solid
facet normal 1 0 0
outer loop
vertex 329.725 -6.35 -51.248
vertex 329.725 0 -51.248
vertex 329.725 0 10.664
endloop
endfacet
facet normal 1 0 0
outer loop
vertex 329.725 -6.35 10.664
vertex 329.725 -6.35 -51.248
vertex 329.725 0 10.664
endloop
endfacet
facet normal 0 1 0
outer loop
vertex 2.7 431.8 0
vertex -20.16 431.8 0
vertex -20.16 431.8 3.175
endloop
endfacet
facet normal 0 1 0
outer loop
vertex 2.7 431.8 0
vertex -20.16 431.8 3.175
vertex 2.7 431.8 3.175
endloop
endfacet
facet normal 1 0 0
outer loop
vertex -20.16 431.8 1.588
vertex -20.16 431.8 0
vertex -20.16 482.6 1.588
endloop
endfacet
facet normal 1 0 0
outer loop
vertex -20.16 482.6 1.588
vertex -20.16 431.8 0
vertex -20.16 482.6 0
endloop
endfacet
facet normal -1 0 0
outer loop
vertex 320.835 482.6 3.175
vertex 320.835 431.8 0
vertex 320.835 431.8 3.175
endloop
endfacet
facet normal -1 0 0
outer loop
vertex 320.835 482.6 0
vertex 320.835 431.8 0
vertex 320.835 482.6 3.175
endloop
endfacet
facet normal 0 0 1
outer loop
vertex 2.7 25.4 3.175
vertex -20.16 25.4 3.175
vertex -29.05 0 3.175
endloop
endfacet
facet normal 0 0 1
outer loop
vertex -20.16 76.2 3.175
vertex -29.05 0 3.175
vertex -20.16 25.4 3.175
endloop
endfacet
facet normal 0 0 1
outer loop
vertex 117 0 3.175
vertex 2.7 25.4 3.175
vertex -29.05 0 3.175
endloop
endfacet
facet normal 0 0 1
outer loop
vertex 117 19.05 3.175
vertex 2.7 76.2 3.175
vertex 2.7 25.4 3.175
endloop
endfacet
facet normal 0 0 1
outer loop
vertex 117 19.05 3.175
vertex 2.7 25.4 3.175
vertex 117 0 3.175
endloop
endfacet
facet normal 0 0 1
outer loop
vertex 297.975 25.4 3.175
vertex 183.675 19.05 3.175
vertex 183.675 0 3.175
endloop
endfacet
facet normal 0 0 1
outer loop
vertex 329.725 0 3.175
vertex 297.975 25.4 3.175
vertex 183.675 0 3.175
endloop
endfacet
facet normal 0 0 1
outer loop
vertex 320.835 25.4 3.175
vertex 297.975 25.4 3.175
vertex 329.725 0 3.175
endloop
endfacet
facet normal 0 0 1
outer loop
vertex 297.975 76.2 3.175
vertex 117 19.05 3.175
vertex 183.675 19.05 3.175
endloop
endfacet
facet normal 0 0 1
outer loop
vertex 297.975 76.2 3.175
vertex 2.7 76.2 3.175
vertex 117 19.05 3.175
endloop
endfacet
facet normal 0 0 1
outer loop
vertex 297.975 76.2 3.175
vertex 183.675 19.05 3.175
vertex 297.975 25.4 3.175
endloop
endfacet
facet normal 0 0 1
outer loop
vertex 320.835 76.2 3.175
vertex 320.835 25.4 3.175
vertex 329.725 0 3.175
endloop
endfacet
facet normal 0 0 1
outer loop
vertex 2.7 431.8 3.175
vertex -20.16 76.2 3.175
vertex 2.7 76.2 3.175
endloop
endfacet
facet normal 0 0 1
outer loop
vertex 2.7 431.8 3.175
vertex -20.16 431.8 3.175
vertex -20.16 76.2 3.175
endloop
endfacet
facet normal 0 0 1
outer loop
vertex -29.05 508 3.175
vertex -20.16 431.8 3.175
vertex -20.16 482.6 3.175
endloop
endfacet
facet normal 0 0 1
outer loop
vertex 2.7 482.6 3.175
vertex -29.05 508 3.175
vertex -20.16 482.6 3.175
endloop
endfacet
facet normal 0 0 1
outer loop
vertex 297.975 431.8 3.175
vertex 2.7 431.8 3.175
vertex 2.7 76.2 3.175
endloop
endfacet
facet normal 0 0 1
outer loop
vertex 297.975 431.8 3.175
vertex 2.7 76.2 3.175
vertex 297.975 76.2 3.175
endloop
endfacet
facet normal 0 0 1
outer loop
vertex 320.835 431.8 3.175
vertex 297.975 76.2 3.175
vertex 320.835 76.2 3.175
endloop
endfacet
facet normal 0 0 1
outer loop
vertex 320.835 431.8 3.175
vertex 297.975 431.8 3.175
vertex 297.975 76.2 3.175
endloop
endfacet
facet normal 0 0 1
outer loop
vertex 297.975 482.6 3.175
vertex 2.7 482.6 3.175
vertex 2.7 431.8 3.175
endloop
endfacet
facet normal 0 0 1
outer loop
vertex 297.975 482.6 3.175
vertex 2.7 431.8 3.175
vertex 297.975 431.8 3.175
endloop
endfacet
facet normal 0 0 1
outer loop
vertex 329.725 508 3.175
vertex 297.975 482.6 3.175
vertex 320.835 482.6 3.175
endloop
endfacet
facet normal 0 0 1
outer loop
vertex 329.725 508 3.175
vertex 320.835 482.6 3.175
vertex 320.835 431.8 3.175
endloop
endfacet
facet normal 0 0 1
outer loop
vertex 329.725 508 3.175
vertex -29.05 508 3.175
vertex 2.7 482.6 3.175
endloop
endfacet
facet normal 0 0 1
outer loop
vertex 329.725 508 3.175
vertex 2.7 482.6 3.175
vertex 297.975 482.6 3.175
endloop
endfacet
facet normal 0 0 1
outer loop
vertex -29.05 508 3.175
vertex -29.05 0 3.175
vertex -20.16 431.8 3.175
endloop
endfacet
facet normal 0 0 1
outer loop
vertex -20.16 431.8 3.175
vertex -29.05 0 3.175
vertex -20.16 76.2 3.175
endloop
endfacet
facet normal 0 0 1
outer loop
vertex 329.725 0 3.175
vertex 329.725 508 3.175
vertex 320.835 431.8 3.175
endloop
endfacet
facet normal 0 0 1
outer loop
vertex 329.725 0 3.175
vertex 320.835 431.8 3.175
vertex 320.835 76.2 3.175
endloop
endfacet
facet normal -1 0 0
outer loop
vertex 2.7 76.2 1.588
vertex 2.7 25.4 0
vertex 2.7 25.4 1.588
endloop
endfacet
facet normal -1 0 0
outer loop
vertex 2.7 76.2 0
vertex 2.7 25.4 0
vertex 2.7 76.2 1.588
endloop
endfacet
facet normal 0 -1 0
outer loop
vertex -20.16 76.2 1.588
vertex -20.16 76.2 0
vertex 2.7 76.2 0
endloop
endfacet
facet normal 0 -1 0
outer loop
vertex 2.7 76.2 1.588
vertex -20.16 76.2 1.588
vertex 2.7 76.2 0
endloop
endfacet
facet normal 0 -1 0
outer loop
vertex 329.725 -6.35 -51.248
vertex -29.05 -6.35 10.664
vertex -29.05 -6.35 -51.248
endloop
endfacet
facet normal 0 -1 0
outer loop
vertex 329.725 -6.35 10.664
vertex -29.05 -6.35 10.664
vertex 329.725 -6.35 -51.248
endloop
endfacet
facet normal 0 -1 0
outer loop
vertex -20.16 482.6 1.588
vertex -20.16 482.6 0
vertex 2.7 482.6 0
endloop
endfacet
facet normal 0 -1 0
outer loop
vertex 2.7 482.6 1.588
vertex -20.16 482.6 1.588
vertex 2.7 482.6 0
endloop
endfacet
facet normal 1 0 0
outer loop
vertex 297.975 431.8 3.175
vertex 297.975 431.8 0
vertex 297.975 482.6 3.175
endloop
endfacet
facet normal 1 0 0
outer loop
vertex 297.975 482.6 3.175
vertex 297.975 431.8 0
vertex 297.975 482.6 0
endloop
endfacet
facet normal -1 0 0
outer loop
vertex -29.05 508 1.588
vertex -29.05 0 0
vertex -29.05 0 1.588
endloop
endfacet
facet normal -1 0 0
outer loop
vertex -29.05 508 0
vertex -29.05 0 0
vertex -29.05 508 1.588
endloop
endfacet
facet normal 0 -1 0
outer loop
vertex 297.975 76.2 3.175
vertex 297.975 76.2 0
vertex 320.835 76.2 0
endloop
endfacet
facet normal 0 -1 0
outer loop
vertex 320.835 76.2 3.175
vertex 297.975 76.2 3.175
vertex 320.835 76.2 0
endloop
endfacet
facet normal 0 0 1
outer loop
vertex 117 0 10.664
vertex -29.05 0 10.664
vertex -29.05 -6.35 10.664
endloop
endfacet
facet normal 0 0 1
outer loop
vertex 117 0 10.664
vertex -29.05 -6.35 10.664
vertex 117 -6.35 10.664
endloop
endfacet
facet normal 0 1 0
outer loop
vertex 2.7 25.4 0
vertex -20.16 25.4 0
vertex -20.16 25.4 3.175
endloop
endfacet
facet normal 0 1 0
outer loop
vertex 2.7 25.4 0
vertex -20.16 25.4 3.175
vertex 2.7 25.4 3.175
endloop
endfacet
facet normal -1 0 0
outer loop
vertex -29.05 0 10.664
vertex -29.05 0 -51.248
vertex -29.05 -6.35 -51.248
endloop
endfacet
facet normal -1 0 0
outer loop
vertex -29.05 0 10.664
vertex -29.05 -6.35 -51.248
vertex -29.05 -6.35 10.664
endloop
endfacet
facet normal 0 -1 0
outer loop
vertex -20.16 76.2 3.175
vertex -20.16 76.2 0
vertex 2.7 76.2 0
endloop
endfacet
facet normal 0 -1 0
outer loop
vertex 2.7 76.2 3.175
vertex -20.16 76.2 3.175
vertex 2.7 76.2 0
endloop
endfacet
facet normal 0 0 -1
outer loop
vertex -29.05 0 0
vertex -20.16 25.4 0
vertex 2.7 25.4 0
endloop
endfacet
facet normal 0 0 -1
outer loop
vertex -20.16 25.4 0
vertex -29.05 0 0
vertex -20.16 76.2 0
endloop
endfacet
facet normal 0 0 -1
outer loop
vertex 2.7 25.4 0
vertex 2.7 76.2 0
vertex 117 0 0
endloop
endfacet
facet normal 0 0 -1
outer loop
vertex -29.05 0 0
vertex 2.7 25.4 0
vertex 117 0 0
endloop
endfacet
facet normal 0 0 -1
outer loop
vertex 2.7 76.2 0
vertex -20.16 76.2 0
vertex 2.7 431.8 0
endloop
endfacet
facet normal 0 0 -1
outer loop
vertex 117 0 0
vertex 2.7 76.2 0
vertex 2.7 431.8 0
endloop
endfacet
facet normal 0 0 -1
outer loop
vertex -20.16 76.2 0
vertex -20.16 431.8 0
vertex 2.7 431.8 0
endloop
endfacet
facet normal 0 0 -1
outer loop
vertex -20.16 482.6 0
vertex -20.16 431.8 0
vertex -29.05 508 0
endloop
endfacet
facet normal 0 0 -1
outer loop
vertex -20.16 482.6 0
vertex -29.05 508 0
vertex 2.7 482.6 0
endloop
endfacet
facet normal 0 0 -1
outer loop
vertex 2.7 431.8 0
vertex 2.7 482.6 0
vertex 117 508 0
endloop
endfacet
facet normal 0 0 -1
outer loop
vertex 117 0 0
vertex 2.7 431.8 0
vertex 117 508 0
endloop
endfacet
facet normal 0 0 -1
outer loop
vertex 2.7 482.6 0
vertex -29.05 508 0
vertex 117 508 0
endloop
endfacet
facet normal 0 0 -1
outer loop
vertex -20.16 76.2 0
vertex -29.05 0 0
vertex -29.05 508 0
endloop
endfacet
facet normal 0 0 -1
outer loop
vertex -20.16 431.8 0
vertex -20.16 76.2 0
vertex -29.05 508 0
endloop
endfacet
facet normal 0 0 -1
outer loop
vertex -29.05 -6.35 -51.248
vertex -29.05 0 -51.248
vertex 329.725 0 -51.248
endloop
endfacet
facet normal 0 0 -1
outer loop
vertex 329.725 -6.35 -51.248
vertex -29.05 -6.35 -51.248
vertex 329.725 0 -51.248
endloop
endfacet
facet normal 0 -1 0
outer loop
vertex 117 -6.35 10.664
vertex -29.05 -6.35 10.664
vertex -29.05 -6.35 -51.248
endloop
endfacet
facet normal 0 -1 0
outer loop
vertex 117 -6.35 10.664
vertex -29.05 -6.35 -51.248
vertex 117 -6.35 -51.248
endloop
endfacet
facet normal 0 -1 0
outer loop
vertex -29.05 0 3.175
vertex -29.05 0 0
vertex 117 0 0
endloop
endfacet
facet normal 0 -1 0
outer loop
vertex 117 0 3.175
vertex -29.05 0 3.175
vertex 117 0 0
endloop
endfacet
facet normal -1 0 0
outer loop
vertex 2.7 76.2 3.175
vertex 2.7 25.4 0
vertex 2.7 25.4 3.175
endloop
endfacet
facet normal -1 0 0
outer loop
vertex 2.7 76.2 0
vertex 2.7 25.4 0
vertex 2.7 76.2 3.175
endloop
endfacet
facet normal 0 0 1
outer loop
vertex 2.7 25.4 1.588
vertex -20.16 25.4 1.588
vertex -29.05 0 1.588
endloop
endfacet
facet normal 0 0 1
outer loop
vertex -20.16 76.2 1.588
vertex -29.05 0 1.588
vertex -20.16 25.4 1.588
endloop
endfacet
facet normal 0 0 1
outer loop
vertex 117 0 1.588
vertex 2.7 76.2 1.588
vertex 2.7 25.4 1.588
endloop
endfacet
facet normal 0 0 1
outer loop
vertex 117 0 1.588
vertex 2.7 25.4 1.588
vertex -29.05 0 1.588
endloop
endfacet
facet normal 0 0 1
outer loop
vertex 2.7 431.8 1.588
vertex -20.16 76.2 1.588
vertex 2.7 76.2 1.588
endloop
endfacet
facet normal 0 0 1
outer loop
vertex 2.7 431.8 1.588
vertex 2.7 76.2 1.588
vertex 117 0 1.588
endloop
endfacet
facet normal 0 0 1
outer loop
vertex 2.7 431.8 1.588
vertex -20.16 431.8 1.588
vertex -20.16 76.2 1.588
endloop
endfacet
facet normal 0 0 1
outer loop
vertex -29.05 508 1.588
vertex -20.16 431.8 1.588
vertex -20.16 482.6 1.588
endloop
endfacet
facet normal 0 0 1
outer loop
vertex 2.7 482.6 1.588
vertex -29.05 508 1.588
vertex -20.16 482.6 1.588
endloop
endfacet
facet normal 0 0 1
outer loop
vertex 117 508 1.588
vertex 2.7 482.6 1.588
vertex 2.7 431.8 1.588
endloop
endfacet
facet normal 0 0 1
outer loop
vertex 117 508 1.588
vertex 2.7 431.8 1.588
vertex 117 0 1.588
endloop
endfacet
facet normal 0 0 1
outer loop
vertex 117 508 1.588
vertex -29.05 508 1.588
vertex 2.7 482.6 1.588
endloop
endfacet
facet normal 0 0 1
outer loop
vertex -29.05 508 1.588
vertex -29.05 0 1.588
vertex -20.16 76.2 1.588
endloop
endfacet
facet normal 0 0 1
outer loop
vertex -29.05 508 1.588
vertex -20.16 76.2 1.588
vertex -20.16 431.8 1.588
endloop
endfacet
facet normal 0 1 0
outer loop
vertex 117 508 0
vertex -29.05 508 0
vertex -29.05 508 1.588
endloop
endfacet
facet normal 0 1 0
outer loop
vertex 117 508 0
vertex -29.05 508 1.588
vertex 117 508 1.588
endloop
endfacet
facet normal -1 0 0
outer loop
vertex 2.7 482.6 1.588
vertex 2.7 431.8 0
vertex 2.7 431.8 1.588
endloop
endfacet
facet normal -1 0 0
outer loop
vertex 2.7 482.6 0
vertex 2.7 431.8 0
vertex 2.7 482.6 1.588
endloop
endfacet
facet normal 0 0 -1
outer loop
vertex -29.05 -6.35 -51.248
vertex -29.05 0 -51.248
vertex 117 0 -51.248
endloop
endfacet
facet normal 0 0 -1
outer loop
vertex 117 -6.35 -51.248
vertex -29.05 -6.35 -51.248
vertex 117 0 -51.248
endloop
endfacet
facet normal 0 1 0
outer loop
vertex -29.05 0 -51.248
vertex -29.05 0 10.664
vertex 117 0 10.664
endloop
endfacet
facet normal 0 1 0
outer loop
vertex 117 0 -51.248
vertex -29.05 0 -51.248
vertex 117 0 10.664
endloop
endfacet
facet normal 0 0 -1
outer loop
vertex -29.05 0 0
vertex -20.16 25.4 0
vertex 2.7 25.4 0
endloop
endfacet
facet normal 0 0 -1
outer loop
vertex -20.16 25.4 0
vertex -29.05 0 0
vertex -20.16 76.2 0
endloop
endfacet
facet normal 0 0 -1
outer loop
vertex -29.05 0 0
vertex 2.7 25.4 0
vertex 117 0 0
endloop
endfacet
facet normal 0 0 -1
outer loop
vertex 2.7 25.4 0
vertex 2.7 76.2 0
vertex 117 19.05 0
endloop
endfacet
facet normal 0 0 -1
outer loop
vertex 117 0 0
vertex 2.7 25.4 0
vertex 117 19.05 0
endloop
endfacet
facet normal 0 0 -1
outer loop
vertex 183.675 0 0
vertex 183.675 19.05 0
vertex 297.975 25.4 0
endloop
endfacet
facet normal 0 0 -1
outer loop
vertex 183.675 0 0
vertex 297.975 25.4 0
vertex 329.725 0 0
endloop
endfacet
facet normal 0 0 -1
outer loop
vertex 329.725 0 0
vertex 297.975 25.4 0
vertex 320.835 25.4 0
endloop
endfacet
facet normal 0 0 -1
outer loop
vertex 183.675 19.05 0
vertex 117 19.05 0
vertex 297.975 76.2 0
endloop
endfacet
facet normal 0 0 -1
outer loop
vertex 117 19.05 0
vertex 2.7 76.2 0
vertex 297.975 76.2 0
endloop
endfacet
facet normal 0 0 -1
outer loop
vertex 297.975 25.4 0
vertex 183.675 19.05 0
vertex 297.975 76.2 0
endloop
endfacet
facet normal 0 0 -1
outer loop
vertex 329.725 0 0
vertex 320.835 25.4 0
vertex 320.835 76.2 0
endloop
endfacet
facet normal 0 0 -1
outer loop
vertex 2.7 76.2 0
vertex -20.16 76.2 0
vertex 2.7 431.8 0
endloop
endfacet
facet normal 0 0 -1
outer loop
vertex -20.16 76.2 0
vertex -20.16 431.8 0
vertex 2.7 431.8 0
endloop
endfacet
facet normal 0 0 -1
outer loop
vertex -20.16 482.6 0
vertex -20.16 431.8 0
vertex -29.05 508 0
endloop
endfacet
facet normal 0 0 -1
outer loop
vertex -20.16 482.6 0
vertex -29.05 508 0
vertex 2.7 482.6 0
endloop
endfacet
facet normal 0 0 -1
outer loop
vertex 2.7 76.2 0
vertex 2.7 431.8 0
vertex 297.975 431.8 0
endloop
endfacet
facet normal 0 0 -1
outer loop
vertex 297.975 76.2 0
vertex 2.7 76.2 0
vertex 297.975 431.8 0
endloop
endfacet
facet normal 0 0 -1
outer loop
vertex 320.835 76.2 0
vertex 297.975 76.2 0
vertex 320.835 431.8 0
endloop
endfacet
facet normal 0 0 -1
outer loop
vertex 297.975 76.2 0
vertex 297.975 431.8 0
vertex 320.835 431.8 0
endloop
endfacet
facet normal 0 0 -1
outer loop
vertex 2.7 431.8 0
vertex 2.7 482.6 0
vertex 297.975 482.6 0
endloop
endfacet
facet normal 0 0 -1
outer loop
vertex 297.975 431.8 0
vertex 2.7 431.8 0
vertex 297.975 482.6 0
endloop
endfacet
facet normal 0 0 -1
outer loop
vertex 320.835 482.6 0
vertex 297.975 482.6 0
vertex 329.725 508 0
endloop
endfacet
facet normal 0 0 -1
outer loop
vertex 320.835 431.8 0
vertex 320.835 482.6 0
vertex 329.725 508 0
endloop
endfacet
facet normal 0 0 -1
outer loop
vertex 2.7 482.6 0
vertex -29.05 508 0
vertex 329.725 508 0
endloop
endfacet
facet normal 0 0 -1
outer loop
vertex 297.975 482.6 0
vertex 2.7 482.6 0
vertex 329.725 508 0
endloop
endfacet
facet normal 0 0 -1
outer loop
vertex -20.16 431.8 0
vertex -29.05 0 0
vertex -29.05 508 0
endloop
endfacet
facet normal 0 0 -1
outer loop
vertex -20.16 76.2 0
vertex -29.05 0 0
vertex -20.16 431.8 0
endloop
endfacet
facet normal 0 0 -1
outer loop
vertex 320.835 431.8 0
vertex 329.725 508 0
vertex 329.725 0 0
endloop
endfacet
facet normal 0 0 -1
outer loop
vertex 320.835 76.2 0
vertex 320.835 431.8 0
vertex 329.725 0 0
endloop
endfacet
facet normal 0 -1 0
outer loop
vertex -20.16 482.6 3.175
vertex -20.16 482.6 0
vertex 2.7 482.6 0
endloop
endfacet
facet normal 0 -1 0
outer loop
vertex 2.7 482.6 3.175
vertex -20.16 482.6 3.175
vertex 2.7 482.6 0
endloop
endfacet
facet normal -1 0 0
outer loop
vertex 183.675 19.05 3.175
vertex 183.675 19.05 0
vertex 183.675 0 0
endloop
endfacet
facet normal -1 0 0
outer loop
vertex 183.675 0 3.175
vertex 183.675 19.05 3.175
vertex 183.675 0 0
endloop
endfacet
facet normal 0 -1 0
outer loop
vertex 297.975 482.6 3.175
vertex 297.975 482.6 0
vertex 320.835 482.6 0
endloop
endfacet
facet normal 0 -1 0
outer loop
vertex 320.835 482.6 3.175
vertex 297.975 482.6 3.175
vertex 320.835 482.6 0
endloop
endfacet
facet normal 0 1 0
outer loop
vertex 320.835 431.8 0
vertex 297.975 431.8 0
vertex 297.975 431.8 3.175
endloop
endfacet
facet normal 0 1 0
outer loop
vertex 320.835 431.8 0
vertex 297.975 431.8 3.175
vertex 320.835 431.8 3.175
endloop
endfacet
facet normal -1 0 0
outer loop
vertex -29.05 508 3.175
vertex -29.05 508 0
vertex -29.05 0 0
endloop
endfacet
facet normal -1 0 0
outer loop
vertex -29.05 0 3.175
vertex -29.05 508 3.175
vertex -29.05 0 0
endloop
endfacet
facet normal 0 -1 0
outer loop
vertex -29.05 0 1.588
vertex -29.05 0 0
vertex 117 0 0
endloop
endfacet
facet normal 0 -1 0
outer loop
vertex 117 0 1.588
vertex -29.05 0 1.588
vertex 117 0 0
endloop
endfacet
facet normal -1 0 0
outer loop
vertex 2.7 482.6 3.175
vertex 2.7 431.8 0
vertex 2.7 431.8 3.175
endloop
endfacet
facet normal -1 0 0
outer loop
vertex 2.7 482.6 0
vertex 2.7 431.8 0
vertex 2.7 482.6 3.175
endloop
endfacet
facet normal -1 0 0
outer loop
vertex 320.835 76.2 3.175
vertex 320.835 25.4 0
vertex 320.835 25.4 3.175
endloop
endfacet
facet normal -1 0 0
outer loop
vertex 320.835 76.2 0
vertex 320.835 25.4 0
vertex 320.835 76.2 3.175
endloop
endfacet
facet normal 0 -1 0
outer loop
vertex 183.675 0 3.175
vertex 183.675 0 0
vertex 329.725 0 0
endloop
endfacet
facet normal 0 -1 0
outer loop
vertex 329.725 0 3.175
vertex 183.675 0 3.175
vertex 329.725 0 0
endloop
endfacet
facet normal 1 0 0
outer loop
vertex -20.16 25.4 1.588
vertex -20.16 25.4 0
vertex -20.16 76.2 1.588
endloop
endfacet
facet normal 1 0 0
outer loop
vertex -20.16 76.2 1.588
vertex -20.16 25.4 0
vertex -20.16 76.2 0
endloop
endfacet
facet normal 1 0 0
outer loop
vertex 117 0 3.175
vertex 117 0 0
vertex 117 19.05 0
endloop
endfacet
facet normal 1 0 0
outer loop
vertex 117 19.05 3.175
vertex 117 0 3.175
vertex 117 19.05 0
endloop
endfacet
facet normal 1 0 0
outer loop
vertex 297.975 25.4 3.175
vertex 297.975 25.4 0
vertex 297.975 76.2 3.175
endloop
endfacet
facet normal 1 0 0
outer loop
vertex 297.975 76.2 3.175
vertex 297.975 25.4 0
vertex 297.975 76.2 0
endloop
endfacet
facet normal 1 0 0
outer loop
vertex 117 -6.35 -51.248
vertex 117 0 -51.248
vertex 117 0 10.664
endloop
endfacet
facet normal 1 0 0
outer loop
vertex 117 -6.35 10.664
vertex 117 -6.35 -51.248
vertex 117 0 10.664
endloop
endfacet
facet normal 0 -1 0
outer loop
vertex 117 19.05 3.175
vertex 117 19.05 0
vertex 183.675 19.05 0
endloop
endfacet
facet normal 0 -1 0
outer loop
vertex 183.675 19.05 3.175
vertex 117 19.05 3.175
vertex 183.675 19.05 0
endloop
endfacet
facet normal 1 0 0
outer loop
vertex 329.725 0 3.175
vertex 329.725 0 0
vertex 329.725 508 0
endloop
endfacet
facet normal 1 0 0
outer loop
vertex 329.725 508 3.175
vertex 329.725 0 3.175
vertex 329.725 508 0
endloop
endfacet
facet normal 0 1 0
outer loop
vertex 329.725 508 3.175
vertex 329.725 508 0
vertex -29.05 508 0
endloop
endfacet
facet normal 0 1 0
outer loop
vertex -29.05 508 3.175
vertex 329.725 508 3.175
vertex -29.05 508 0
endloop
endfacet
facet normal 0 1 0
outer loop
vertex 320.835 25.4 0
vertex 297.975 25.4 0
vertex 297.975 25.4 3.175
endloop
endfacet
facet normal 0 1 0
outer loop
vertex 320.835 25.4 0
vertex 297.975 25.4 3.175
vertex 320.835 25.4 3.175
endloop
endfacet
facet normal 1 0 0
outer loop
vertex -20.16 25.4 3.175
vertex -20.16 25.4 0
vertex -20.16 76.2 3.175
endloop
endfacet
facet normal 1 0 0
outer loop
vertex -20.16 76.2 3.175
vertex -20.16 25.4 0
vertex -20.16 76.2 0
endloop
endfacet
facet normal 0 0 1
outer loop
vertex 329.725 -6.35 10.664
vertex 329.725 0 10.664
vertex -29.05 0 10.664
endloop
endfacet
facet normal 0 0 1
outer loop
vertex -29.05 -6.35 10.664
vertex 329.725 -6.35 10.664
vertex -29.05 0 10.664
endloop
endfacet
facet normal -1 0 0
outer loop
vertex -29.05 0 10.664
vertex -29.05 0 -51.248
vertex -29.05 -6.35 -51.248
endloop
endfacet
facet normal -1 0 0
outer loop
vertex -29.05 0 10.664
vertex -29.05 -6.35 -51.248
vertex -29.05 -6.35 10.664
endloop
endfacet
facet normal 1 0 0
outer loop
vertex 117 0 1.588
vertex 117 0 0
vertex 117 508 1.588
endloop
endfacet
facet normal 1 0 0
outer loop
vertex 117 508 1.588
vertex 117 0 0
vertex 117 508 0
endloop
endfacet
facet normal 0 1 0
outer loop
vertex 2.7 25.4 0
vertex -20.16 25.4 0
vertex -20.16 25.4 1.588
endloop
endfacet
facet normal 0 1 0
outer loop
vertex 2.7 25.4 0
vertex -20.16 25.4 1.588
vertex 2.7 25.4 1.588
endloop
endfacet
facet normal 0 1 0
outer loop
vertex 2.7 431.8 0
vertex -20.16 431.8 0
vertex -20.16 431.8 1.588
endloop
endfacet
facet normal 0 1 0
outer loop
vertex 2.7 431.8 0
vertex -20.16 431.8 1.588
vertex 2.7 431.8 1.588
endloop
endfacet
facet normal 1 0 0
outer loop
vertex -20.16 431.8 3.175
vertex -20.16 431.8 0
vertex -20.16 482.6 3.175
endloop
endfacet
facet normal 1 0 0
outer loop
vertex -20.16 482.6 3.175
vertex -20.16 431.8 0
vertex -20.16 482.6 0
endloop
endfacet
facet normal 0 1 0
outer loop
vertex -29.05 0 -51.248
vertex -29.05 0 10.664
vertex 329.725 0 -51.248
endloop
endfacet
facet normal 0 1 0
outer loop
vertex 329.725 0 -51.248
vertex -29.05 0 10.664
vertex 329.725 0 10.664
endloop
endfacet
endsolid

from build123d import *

# Parameters (mm, degrees)
F0_W     = 146.05
F0_H     = 61.9125
F0_W_2   = 212.725
F1_DEPTH = 6.35
F2_DEPTH = 6.35
F3_W     = 146.05
F3_H     = 508
F3_W_2   = 22.86
F3_H_2   = 50.8
F4_DEPTH = 1.5875
F5_W     = 22.86
F5_H     = 50.8
F6_DEPTH = 3.175


with BuildPart() as f1:
    # F0 (on Front) → F1 (new body)
    with BuildSketch(Plane.XZ):
        with Locations((43.9746357441, -20.2918192999)):
            Rectangle(F0_W, F0_H)
        with Locations((223.3621357441, -20.2918192999)):
            Rectangle(F0_W_2, F0_H)
    extrude(amount=F1_DEPTH)


with BuildPart() as f2:
    # F0 (on Front) → F2 (new body)
    with BuildSketch(Plane.XZ):
        with Locations((43.9746357441, -20.2918192999)):
            Rectangle(F0_W, F0_H)
    extrude(amount=F2_DEPTH)


with BuildPart() as f4:
    # F3 (on Top) → F4 (new body)
    with BuildSketch(Plane.XY):
        with Locations((43.9746357441, 254)):
            Rectangle(F3_W, F3_H)
        with Locations((-8.7303642559, 50.8)):
            Rectangle(F3_W_2, F3_H_2, mode=Mode.SUBTRACT)
        with Locations((-8.7303642559, 457.2)):
            Rectangle(F3_W_2, F3_H_2, mode=Mode.SUBTRACT)
    extrude(amount=F4_DEPTH)


with BuildPart() as f6:
    # F5 (on Top) → F6 (new body)
    with BuildSketch(Plane.XY):
        Polygon((-29.0503642559, 508), (-29.0503642559, 0), (116.9996357441, 0), (116.9996357441, 19.05), (183.6746357441, 19.05), (183.6746357441, 0), (329.7246357441, 0), (329.7246357441, 508), align=None)
        with Locations((-8.7303642559, 50.8)):
            Rectangle(F5_W, F5_H, mode=Mode.SUBTRACT)
        with Locations((309.4046357441, 50.8)):
            Rectangle(F5_W, F5_H, mode=Mode.SUBTRACT)
        with Locations((-8.7303642559, 457.2)):
            Rectangle(F5_W, F5_H, mode=Mode.SUBTRACT)
        with Locations((309.4046357441, 457.2)):
            Rectangle(F5_W, F5_H, mode=Mode.SUBTRACT)
    extrude(amount=F6_DEPTH)


solid = Compound([f1.part, f2.part, f4.part, f6.part])
